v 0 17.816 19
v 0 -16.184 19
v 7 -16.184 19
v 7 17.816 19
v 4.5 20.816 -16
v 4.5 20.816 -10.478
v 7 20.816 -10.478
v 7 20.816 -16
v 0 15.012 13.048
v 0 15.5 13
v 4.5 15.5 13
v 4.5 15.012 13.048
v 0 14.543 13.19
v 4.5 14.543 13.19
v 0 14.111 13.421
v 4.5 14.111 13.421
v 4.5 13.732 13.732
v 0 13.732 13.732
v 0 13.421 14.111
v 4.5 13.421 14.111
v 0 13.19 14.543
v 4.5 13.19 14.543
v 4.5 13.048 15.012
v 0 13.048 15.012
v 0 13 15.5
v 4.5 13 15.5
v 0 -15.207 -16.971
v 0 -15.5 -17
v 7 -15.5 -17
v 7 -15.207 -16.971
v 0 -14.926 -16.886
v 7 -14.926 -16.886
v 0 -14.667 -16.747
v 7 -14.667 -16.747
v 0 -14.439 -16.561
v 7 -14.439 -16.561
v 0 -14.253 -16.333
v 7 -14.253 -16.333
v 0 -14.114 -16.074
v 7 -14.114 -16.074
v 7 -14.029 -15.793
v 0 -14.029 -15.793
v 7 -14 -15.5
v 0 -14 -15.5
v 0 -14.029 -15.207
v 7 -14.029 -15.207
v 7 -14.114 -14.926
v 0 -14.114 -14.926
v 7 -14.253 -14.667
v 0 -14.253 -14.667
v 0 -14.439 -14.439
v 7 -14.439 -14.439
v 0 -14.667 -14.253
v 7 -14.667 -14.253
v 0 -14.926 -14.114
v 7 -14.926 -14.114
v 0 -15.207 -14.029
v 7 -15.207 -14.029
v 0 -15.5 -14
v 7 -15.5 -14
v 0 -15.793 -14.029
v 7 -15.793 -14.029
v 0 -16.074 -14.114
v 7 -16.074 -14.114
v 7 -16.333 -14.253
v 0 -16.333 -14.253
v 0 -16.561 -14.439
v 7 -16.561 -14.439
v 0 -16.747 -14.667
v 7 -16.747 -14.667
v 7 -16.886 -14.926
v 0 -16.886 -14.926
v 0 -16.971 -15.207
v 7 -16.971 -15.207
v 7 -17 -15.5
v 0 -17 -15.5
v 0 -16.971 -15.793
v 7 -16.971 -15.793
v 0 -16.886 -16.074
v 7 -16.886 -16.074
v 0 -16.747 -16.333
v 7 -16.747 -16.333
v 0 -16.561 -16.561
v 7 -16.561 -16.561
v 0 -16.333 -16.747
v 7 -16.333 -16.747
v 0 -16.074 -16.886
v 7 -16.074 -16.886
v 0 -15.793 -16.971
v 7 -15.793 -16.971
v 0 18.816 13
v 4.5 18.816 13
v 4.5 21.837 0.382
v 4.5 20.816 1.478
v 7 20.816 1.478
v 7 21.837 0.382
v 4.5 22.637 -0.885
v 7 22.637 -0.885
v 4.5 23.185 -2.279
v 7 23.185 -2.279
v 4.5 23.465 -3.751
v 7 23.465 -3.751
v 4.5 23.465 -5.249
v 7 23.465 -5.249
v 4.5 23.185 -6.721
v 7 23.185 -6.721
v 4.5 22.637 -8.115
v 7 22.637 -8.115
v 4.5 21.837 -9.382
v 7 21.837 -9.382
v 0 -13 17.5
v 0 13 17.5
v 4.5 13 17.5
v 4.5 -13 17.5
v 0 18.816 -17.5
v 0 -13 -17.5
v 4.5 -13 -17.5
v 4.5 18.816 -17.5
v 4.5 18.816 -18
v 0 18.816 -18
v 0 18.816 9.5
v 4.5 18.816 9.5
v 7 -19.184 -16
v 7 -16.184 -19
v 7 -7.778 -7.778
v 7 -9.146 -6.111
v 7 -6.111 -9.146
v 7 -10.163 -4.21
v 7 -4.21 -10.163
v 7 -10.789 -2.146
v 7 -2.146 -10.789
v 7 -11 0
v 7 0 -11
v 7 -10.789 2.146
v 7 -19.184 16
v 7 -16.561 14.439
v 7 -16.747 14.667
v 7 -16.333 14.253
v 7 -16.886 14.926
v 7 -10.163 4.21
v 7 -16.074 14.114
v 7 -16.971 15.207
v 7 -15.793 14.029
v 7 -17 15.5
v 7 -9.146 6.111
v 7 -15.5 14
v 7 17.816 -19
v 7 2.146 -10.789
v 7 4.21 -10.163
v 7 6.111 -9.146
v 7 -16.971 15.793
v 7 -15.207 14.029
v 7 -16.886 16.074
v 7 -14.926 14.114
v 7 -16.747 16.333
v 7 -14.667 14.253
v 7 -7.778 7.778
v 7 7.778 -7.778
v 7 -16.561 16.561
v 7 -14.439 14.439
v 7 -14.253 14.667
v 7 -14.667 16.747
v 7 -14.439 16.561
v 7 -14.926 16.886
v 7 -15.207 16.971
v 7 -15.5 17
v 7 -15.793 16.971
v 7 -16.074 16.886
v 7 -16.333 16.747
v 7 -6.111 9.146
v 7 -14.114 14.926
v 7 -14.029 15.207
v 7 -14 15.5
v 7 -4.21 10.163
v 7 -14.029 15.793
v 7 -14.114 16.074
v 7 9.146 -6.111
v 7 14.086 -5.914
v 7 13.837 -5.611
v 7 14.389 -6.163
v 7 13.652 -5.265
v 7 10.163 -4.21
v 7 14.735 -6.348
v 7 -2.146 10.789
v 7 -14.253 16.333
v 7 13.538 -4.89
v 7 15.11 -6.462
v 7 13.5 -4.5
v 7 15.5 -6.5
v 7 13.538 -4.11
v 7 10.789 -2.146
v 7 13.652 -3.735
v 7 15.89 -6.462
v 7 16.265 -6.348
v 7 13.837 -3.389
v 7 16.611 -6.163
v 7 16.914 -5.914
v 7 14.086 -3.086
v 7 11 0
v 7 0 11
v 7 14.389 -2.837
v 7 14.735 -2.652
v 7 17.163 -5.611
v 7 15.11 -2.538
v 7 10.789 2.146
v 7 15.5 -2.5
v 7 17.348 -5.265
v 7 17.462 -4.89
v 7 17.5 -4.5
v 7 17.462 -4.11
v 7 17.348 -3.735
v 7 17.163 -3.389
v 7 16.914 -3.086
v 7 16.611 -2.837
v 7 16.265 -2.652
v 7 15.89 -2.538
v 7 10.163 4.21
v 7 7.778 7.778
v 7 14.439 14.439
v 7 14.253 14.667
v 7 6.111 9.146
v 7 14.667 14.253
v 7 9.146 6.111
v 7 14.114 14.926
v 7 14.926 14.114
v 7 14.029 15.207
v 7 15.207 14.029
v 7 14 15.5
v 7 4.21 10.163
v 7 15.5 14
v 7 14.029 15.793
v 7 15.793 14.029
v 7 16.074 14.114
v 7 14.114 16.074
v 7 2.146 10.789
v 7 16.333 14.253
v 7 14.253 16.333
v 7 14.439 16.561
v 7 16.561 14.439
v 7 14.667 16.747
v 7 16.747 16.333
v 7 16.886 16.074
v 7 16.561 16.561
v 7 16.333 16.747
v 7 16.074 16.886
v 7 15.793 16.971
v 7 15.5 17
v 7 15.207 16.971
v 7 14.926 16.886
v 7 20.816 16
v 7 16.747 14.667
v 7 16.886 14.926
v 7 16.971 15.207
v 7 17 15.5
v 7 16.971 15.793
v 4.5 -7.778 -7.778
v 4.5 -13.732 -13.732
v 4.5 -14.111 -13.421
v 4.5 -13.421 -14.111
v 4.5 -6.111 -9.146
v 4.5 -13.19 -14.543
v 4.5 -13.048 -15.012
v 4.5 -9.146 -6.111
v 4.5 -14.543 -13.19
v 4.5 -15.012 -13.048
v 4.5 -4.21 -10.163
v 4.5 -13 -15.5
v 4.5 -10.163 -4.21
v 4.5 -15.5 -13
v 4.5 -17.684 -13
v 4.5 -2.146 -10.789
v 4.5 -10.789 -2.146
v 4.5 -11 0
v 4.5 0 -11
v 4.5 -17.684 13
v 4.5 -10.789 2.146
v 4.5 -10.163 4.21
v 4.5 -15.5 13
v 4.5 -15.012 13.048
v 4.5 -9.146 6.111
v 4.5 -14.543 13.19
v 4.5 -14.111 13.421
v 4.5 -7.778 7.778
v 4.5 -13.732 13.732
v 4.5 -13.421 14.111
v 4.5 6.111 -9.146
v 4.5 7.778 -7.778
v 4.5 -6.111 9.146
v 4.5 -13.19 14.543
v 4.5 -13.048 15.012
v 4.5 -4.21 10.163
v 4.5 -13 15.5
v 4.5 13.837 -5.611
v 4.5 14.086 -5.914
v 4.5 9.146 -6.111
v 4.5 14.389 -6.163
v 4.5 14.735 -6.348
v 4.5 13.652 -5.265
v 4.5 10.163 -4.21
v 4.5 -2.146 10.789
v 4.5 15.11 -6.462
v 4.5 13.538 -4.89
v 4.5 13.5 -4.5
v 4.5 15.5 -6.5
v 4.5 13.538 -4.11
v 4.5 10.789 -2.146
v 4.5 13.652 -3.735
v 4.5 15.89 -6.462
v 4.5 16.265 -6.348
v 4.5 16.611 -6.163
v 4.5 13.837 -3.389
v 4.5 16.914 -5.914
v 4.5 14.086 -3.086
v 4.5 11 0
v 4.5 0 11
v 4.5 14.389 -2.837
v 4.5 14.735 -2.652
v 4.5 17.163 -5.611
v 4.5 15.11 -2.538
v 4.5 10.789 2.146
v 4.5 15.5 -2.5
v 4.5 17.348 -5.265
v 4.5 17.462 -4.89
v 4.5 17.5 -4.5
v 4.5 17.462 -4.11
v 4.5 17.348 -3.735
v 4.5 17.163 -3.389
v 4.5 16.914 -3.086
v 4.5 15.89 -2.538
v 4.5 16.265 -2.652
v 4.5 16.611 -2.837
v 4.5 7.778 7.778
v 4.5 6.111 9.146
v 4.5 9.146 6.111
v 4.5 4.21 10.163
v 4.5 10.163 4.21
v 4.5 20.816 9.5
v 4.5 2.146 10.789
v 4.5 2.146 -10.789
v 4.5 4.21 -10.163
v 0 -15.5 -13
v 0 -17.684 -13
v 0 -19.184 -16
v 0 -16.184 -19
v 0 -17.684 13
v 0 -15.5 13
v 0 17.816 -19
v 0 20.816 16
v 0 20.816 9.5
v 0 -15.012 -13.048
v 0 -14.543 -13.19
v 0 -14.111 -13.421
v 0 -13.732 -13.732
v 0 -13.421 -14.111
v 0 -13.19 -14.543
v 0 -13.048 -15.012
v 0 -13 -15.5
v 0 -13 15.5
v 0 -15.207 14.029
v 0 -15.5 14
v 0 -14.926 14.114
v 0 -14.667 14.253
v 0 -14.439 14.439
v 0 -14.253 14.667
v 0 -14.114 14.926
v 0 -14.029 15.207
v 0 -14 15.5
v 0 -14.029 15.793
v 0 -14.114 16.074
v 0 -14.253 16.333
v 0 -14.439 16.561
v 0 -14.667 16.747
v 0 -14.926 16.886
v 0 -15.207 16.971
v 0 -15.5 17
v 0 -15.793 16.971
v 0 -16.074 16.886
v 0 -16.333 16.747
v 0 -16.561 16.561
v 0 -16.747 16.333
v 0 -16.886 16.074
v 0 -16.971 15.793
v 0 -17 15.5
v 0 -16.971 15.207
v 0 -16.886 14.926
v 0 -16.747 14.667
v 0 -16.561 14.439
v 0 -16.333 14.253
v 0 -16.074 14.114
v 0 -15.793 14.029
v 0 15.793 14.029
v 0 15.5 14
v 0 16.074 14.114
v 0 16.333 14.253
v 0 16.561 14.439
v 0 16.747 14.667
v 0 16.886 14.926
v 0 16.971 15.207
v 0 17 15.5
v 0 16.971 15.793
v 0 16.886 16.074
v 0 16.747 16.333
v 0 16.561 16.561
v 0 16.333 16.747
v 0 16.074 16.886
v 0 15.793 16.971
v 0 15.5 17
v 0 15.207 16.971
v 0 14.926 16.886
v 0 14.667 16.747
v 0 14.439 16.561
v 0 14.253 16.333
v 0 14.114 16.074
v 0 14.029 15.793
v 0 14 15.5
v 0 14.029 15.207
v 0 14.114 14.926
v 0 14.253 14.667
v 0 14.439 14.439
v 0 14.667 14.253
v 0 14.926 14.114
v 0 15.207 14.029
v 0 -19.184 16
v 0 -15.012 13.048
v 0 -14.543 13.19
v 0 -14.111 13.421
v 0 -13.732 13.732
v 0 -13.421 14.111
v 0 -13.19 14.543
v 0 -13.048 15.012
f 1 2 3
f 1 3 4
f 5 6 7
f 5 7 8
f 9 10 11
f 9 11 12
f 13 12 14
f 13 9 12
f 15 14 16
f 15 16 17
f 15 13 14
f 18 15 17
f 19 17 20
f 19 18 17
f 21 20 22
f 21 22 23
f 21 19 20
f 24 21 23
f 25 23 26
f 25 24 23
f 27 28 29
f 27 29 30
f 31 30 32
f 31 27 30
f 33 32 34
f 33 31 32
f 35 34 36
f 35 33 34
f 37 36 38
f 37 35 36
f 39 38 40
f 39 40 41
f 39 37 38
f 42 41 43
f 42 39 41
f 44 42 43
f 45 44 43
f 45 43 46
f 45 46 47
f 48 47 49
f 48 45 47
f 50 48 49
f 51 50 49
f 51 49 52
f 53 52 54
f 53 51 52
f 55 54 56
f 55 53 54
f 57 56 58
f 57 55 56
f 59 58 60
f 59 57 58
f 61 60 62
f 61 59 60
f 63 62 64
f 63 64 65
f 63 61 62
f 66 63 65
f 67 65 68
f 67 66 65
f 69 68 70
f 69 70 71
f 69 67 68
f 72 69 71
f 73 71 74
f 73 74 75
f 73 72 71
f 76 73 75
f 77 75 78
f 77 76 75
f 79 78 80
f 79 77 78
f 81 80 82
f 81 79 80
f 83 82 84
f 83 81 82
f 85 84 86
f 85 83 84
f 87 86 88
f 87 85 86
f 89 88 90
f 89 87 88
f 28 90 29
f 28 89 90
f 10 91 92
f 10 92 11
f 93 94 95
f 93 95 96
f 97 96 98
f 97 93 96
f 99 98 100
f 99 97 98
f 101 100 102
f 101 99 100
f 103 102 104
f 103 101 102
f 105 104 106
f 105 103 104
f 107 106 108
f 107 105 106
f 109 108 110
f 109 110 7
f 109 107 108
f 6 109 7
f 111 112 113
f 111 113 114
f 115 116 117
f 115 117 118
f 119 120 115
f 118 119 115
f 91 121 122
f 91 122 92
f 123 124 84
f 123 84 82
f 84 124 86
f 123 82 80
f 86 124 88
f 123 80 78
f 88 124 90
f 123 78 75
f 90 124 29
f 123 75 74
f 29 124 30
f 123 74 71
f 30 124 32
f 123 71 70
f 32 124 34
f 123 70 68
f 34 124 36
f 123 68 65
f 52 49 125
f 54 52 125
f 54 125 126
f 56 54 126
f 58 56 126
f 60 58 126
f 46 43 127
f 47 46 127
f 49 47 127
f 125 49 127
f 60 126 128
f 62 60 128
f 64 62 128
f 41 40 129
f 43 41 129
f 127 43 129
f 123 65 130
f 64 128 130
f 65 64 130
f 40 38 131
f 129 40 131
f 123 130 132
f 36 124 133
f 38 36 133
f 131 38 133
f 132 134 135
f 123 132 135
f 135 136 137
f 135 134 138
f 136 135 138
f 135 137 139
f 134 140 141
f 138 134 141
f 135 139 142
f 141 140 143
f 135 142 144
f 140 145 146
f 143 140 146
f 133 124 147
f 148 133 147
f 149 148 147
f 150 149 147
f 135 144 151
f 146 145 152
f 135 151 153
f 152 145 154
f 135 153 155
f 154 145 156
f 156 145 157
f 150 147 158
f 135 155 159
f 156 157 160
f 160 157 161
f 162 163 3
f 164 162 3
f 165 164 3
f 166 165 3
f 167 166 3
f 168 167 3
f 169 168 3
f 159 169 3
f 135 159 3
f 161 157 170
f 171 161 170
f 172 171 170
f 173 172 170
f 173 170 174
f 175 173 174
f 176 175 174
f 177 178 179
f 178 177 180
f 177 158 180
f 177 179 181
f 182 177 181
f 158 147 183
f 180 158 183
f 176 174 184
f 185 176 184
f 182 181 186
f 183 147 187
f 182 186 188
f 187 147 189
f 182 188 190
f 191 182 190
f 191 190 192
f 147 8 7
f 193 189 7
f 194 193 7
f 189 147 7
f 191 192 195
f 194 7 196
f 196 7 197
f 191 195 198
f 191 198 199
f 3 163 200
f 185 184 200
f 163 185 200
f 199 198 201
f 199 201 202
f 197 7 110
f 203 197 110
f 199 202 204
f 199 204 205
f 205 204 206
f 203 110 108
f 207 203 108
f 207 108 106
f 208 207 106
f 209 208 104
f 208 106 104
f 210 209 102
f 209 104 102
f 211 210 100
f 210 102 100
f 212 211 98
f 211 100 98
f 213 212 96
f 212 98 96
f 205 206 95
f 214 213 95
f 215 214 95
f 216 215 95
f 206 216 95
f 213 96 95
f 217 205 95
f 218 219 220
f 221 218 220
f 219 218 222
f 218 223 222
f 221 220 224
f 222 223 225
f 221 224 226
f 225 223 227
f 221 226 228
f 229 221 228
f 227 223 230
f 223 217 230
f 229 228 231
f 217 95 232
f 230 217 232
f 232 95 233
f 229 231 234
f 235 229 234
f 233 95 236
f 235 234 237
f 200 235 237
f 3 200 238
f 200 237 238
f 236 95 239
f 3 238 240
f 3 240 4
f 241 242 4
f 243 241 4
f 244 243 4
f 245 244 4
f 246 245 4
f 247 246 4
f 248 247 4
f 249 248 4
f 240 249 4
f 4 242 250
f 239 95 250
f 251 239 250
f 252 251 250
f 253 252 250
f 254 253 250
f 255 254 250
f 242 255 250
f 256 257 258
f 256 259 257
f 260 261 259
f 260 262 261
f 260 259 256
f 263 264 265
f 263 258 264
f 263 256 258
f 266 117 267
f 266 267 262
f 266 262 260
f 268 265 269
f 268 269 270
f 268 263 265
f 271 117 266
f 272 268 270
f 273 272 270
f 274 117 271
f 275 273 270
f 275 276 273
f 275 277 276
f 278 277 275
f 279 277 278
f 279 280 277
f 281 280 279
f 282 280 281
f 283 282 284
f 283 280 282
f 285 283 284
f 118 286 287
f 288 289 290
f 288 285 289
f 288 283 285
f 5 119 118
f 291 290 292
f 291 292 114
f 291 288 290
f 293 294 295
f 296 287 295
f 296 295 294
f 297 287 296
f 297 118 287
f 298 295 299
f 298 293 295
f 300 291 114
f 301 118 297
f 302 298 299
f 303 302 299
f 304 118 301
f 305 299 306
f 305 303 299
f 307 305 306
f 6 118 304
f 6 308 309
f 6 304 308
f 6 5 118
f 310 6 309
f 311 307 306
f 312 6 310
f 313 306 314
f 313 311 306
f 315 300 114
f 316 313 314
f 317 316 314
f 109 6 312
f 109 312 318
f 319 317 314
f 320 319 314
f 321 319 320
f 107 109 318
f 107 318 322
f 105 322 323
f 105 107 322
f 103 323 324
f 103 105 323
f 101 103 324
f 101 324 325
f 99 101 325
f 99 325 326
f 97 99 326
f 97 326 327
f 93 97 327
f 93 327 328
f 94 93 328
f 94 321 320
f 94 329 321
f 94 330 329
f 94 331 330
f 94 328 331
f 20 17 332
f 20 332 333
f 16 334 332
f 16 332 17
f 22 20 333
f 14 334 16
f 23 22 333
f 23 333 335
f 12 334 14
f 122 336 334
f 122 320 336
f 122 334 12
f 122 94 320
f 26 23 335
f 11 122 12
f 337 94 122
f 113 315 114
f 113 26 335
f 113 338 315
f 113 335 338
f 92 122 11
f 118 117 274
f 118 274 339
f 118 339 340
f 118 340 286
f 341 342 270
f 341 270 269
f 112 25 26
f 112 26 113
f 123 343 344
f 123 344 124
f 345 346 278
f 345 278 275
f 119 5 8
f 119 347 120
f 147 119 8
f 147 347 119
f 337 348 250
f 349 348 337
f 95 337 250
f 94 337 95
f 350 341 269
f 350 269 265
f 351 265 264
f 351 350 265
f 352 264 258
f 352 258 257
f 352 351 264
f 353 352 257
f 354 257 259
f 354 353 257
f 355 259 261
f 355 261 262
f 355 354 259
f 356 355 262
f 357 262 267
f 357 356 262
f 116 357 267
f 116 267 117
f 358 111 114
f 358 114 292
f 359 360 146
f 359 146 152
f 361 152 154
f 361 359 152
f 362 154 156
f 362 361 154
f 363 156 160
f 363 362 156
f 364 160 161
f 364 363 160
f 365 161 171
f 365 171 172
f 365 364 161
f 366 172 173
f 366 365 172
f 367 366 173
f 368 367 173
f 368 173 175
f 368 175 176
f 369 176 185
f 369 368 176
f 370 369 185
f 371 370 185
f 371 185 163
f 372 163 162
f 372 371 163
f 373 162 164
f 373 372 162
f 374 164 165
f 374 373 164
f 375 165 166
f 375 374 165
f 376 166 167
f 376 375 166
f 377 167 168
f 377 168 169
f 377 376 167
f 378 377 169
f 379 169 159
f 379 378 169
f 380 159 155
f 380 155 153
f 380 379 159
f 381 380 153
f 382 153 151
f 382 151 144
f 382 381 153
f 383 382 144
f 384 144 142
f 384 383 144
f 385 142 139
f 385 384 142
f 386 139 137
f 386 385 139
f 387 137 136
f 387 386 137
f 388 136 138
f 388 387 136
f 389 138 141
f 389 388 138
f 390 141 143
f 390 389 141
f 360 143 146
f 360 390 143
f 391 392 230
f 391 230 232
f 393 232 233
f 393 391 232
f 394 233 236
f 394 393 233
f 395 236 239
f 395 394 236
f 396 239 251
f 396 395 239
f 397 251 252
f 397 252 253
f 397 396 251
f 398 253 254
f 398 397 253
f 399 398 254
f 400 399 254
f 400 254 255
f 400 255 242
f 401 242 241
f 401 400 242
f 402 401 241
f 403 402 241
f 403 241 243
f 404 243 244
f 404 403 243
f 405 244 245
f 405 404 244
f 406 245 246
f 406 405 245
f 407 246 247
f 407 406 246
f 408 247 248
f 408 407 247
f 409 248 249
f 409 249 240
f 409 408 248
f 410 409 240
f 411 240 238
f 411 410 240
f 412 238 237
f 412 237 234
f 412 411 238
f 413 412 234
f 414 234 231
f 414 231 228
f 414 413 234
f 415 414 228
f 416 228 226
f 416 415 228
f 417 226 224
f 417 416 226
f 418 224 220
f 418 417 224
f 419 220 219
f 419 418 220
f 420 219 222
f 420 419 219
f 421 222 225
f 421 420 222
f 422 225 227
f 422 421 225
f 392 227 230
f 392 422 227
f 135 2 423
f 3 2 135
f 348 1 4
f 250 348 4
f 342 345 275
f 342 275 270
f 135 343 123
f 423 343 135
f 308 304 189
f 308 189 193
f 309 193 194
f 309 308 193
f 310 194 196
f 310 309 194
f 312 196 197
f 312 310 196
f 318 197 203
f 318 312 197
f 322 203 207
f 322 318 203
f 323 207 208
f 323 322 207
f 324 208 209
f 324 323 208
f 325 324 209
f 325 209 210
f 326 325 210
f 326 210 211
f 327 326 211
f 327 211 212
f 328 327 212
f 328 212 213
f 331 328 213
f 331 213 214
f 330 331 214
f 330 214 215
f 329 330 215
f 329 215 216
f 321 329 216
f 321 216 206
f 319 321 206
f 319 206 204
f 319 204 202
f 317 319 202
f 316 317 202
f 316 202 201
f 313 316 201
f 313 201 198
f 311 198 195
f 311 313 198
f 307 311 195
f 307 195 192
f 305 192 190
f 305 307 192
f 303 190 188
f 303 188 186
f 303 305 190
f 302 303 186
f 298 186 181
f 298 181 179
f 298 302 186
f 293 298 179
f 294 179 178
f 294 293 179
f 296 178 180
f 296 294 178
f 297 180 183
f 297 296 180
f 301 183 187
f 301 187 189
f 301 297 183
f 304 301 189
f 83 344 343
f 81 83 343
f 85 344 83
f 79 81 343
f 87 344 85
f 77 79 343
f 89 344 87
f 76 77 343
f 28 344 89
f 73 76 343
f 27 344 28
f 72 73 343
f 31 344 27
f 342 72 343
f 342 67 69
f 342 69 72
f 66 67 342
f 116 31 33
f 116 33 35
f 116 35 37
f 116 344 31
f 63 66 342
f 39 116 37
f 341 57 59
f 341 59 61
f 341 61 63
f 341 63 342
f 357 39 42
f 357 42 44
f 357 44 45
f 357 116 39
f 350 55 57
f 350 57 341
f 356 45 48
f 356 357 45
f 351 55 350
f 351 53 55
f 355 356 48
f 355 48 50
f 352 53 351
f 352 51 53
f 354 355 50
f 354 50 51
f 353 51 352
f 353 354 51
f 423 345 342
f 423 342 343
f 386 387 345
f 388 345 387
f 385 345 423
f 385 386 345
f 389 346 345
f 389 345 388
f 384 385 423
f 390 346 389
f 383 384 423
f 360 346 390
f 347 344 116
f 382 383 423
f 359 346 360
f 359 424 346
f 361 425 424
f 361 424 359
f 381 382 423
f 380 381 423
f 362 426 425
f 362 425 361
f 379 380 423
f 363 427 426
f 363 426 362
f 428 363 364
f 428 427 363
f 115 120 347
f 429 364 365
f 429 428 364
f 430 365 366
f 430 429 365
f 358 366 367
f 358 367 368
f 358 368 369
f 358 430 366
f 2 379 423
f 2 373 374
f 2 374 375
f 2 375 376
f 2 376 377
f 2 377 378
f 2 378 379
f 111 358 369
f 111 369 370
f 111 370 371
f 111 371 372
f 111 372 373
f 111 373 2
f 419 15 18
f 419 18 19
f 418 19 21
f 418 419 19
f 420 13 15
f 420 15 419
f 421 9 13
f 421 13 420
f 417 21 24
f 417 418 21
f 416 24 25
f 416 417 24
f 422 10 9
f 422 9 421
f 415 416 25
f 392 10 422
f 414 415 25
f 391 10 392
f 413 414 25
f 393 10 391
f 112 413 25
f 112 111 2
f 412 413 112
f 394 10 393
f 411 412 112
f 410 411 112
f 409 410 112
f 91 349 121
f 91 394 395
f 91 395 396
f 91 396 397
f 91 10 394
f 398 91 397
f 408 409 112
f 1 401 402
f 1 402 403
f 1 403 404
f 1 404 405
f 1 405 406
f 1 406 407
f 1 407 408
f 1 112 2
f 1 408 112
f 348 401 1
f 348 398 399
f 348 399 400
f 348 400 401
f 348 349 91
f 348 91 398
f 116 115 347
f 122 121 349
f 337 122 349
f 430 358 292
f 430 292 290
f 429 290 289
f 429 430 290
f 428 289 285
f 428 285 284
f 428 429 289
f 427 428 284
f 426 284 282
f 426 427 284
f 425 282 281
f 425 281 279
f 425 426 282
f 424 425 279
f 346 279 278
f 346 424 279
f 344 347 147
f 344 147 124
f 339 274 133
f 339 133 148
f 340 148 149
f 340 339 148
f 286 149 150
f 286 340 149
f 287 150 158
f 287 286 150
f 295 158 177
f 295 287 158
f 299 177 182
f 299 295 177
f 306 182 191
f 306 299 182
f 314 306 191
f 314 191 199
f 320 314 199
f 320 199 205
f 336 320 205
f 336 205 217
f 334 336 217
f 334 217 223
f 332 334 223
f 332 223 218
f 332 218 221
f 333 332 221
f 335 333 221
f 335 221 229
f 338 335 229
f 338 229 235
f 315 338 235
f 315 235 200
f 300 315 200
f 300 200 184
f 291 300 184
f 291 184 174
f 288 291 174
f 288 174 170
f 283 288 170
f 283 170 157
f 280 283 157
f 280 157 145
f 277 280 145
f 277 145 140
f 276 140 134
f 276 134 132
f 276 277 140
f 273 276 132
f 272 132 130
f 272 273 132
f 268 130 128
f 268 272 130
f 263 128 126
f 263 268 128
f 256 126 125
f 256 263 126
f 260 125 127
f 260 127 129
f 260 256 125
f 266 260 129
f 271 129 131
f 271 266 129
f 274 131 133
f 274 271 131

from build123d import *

# Parameters (mm, degrees)
SKETCH1_R           = 1.5
SKETCH1_R_2         = 11
SKETCH1_R_3         = 2
BOSS_EXTRUDE1_DEPTH = 7
CUT_EXTRUDE1_DEPTH  = 4.5
SKETCH3_W           = 33.429321272
SKETCH3_H           = 5.85707368
CUT_EXTRUDE2_DEPTH  = 4.5
CHAMFER1_SIZE       = 3


with BuildPart() as part:
    # Sketch1 → Boss-Extrude1 (new body)
    with BuildSketch(Plane(origin=(0, 0, 0), x_dir=(0, 0, -1), z_dir=(1, 0, 0))):
        with BuildLine():
            Line((10.478493311, 20.815789474), (19, 20.815789474))
            Line((19, 20.815789474), (19, -19.184210526))
            Line((19, -19.184210526), (-19, -19.184210526))
            Line((-19, -19.184210526), (-19, 20.815789474))
            Line((-19, 20.815789474), (-1.478493311, 20.815789474))
            ThreePointArc((-1.478493311, 20.815789474), (4.5, 23.5), (10.478493311, 20.815789474))
        make_face()
        with Locations((15.5, -15.5)):
            Circle(SKETCH1_R, mode=Mode.SUBTRACT)
        with Locations((-15.5, 15.5)):
            Circle(SKETCH1_R, mode=Mode.SUBTRACT)
        with Locations((-15.5, -15.5)):
            Circle(SKETCH1_R, mode=Mode.SUBTRACT)
        Circle(SKETCH1_R_2, mode=Mode.SUBTRACT)
        with Locations((4.5, 15.5)):
            Circle(SKETCH1_R_3, mode=Mode.SUBTRACT)
    extrude(amount=BOSS_EXTRUDE1_DEPTH)

    # Sketch2 → Cut-Extrude1 (cut)
    with BuildSketch(Plane.ZY):
        with BuildLine():
            Line((-17.5, -13), (-17.5, 18.815789474))
            Line((-17.5, 18.815789474), (13, 18.815789474))
            Line((13, 18.815789474), (13, 15.5))
            ThreePointArc((13, 15.5), (13.732233047, 13.732233047), (15.5, 13))
            Line((15.5, 13), (17.5, 13))
            Line((17.5, 13), (17.5, -13))
            Line((17.5, -13), (15.5, -13))
            ThreePointArc((15.5, -13), (13.732233047, -13.732233047), (13, -15.5))
            Line((13, -15.5), (13, -17.684210526))
            Line((13, -17.684210526), (-13, -17.684210526))
            Line((-13, -17.684210526), (-13, -15.5))
            ThreePointArc((-13, -15.5), (-13.732233047, -13.732233047), (-15.5, -13))
            Line((-15.5, -13), (-17.5, -13))
        make_face()
    extrude(amount=-CUT_EXTRUDE1_DEPTH, mode=Mode.SUBTRACT)

    # Sketch3 → Cut-Extrude2 (cut)
    with BuildSketch(Plane.ZY):
        with Locations((-7.214660636, 21.744326314)):
            Rectangle(SKETCH3_W, SKETCH3_H)
    extrude(amount=-CUT_EXTRUDE2_DEPTH, mode=Mode.SUBTRACT)

    # Chamfer1
    chamfer1_edges = [part.edges().sort_by_distance(p)[0] for p in [
        (3.5, -19.184210526, -19),
        (3.5, -19.184210526, 19),
        (3.5, 20.815789474, 19),
        (5.75, 20.815789474, -19),
    ]]
    chamfer(chamfer1_edges, length=CHAMFER1_SIZE)


solid = part.part
